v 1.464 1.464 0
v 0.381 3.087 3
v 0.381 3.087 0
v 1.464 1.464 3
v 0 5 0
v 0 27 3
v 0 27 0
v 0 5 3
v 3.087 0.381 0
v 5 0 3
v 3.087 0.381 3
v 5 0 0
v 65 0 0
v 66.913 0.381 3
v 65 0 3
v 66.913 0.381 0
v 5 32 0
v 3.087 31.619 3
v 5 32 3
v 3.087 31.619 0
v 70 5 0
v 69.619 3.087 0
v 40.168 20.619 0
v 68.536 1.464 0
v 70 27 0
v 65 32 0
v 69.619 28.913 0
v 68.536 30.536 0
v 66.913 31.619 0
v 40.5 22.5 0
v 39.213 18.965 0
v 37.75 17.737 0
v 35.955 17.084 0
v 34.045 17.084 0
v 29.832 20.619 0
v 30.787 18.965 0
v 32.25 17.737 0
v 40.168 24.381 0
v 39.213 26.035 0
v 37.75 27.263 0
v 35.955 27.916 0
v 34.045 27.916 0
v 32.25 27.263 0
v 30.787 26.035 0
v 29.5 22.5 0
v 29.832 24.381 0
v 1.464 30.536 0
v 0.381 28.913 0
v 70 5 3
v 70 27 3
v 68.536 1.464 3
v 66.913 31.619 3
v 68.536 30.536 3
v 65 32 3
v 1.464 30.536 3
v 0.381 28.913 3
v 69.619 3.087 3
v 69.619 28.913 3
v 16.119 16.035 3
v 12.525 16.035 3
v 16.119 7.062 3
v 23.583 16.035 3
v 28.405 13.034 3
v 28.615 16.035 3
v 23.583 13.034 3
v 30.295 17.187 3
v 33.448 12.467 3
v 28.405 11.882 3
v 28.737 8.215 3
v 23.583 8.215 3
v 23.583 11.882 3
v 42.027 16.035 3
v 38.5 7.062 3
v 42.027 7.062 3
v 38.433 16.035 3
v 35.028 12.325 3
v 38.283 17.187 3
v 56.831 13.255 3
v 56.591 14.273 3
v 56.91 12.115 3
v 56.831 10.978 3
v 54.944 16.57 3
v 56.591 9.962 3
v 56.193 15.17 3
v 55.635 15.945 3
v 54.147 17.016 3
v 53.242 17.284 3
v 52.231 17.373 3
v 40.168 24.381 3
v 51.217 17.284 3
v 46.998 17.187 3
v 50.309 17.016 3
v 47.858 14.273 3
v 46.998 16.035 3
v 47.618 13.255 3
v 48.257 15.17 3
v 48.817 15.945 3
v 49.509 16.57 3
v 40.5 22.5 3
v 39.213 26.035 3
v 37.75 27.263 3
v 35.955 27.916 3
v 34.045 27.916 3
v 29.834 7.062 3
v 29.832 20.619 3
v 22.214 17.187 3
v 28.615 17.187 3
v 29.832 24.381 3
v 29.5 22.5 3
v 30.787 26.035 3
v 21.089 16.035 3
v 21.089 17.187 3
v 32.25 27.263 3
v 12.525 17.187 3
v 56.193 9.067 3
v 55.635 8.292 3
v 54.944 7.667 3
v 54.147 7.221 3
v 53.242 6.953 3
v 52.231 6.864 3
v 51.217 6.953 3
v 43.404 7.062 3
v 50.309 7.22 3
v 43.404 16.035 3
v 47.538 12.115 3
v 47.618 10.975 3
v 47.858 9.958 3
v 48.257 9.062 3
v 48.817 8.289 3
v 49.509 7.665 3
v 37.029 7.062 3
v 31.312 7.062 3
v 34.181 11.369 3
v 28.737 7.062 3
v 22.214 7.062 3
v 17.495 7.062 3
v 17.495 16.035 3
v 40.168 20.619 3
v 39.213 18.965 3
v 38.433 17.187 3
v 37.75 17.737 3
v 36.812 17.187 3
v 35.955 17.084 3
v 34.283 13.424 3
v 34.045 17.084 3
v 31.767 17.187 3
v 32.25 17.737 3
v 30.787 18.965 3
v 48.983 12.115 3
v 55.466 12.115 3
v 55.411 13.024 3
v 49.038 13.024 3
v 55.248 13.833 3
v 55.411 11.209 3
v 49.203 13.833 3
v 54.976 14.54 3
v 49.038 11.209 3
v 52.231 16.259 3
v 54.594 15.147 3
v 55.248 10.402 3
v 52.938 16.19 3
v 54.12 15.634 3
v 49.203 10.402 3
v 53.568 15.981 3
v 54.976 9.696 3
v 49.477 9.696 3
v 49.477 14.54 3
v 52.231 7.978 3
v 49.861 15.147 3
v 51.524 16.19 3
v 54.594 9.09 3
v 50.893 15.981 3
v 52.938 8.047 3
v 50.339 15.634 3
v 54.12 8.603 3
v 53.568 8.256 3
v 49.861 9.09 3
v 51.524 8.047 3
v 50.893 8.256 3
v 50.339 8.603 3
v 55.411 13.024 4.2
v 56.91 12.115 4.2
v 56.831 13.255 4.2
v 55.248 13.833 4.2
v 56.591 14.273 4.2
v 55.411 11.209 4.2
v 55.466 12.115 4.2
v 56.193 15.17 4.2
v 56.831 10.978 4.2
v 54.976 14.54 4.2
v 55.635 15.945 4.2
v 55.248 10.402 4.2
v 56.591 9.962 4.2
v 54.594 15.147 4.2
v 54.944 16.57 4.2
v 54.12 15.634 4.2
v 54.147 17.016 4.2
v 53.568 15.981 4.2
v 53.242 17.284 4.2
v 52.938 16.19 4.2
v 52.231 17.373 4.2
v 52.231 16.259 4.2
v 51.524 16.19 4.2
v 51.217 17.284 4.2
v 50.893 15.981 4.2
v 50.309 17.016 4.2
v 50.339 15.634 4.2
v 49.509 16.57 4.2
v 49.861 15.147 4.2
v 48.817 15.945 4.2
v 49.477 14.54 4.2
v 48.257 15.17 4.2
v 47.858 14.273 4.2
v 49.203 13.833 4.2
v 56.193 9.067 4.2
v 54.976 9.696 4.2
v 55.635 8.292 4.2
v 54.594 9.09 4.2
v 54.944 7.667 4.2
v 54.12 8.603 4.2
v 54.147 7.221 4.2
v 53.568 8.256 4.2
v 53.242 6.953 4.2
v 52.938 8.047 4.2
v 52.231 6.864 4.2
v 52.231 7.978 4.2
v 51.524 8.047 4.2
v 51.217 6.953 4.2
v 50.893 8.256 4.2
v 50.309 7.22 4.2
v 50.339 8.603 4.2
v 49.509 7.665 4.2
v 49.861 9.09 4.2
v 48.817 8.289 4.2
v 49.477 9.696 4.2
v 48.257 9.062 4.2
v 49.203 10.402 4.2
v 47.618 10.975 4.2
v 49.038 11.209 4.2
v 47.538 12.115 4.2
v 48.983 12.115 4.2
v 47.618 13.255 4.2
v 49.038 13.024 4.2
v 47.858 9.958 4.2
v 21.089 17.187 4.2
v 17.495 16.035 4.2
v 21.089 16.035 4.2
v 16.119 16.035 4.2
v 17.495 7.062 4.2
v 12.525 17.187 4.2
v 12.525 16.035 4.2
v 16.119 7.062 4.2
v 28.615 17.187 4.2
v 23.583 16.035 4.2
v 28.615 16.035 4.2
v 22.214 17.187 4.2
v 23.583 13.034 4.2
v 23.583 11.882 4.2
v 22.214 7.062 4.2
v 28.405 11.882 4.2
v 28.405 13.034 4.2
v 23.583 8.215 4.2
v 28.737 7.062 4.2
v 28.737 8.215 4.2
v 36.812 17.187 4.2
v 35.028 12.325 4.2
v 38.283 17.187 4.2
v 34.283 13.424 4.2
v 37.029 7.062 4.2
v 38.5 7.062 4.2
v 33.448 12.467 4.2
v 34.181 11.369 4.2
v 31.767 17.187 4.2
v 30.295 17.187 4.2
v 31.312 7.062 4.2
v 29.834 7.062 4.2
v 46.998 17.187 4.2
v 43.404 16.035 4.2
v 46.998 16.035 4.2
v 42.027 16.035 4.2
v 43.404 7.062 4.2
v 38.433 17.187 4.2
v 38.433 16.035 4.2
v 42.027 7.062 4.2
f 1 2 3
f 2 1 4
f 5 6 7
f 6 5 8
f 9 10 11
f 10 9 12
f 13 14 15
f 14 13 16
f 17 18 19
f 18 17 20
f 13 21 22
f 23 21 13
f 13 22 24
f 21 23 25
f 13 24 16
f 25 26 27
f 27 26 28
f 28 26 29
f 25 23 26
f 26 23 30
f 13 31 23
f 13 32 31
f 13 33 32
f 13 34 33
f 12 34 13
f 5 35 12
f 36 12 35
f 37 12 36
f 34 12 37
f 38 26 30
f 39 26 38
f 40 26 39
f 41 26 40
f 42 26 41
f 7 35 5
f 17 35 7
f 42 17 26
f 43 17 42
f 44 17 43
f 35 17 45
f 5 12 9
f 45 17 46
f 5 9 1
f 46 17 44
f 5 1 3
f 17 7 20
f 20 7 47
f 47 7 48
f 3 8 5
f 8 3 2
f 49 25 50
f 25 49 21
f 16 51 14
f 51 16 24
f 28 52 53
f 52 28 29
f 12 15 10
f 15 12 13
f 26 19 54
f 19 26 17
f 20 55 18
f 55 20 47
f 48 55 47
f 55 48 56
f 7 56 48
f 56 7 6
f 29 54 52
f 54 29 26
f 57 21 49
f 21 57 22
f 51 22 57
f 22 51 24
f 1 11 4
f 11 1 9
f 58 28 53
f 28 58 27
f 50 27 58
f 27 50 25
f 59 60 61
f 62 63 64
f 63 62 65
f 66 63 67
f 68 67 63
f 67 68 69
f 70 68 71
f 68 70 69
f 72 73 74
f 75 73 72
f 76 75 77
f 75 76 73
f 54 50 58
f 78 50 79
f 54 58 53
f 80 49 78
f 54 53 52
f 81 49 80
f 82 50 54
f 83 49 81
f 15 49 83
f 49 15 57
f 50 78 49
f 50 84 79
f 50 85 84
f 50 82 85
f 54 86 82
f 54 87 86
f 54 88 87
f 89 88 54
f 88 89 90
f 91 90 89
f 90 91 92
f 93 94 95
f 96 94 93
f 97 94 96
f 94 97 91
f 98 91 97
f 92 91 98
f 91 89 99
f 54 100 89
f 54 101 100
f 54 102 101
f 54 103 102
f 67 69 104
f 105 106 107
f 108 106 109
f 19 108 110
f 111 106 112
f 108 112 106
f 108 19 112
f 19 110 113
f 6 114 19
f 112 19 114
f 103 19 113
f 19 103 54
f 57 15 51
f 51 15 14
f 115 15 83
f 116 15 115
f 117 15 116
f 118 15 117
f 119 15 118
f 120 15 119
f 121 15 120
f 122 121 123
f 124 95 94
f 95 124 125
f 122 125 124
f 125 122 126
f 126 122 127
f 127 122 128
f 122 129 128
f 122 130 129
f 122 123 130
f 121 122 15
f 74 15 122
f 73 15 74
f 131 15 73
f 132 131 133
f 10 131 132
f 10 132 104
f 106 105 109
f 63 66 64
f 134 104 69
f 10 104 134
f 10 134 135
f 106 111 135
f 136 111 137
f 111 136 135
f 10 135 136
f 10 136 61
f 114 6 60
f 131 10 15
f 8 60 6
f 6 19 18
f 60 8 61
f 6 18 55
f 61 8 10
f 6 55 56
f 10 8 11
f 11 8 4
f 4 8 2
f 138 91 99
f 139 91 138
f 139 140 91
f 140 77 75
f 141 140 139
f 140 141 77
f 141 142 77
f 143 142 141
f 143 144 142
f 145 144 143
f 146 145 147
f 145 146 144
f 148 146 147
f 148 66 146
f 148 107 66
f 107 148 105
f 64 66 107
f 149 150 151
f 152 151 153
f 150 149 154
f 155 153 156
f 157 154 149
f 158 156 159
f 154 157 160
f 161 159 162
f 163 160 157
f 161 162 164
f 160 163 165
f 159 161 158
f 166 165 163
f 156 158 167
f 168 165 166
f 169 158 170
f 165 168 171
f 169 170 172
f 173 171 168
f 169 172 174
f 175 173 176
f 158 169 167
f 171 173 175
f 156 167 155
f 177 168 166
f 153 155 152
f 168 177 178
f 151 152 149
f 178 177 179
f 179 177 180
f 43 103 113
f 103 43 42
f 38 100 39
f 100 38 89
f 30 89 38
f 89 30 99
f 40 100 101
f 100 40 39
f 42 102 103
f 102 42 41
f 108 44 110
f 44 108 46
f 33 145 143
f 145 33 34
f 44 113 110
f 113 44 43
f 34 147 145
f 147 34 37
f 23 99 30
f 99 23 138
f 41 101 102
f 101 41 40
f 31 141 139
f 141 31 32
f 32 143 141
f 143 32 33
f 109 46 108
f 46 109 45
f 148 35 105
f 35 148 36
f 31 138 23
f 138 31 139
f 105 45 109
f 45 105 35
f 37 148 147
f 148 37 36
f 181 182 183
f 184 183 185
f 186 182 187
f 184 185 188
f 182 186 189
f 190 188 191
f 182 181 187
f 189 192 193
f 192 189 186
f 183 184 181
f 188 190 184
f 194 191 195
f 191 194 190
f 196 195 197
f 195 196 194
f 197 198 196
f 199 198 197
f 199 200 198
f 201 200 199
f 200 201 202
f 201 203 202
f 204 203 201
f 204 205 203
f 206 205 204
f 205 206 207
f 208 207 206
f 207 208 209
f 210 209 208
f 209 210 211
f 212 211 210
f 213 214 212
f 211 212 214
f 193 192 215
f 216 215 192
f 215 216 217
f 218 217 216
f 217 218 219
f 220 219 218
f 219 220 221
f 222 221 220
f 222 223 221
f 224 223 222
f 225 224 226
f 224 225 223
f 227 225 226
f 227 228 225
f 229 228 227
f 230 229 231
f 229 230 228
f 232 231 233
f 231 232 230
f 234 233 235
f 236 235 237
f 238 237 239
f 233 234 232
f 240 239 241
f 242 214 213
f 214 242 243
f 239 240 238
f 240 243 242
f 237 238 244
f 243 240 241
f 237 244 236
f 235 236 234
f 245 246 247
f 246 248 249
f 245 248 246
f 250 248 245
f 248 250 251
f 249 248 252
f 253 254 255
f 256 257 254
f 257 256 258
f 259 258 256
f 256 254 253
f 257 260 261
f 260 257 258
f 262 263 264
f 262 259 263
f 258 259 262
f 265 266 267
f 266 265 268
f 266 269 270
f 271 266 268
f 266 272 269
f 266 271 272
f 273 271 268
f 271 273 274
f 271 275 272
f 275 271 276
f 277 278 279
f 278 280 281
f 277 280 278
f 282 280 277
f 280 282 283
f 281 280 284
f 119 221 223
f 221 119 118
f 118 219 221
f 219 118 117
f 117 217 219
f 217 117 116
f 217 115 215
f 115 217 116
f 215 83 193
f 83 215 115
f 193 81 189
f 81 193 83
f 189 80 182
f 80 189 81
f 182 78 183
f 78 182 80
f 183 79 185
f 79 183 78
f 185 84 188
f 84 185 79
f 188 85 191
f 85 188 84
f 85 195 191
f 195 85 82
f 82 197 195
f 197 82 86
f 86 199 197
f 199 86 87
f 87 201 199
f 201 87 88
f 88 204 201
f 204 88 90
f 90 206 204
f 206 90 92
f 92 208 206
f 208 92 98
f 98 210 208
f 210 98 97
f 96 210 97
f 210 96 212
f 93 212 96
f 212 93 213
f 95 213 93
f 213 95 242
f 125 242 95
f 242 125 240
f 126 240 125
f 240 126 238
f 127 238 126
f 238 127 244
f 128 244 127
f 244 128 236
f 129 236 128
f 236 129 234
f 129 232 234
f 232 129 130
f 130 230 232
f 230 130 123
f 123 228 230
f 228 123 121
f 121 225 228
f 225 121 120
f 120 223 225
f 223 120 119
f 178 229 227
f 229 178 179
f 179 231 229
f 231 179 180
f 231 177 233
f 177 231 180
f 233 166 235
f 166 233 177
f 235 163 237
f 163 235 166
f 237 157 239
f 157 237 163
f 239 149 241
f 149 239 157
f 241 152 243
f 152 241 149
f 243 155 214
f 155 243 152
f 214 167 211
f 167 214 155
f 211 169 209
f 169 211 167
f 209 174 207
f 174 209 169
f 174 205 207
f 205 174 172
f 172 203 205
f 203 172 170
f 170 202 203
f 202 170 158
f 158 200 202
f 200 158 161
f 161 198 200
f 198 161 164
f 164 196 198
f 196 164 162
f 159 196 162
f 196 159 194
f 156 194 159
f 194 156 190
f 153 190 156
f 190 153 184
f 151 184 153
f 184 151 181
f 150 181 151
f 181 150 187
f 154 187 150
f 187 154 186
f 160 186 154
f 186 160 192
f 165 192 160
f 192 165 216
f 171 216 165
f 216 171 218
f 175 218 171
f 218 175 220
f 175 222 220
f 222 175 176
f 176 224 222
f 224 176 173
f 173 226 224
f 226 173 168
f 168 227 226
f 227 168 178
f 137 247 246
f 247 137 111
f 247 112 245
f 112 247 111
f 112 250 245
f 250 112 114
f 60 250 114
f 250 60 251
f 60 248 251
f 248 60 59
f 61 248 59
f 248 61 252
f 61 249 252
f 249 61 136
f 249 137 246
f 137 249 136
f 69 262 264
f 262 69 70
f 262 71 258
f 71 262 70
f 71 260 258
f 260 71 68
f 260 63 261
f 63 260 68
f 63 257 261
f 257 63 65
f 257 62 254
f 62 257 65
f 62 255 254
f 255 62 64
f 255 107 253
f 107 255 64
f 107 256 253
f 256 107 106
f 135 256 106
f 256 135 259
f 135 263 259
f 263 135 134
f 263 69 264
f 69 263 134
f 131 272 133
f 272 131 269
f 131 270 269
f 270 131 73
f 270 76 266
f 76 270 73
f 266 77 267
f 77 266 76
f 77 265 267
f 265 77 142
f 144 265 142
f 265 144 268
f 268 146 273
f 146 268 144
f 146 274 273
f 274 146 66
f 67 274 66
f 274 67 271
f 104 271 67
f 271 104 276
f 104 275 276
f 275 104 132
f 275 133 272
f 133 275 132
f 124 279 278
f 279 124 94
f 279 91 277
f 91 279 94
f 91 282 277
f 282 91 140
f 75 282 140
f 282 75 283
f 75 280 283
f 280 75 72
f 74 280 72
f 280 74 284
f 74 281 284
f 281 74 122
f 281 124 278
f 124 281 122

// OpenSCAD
// ── ETIQUETA PARA CABIDE ──
// Parâmetros injetados pelo backend
texto    = is_undef(texto)    ? "TEXTO"     : texto;
fonte    = is_undef(fonte)    ? "Open Sans" : fonte;
fontSize = is_undef(fontSize) ? 10          : fontSize;

larg    = 70;   // largura da etiqueta
alt_tag = 32;   // altura total
esp     = 3;    // espessura
r_canto = 5;    // raio dos cantos
r_furo  = 5.5;  // raio do furo para o gancho do cabide (cabide standard ~5mm)
prof    = 1.2;  // profundidade do texto

// Corpo com cantos arredondados
module corpo() {
    hull() {
        for (x = [r_canto, larg - r_canto])
            for (y = [r_canto, alt_tag - r_canto])
                translate([x, y, 0]) cylinder(h=esp, r=r_canto);
    }
}

difference() {
    corpo();

    // Furo no topo para encaixar no gancho do cabide
    translate([larg / 2, alt_tag - r_furo - 4, -1])
        cylinder(h=esp + 2, r=r_furo);
}

// Texto em relevo (centrado, ligeiramente abaixo do furo)
translate([larg / 2, alt_tag / 2 - 4, esp])
linear_extrude(prof)
text(texto, size=fontSize, font=fonte, halign="center", valign="center");
